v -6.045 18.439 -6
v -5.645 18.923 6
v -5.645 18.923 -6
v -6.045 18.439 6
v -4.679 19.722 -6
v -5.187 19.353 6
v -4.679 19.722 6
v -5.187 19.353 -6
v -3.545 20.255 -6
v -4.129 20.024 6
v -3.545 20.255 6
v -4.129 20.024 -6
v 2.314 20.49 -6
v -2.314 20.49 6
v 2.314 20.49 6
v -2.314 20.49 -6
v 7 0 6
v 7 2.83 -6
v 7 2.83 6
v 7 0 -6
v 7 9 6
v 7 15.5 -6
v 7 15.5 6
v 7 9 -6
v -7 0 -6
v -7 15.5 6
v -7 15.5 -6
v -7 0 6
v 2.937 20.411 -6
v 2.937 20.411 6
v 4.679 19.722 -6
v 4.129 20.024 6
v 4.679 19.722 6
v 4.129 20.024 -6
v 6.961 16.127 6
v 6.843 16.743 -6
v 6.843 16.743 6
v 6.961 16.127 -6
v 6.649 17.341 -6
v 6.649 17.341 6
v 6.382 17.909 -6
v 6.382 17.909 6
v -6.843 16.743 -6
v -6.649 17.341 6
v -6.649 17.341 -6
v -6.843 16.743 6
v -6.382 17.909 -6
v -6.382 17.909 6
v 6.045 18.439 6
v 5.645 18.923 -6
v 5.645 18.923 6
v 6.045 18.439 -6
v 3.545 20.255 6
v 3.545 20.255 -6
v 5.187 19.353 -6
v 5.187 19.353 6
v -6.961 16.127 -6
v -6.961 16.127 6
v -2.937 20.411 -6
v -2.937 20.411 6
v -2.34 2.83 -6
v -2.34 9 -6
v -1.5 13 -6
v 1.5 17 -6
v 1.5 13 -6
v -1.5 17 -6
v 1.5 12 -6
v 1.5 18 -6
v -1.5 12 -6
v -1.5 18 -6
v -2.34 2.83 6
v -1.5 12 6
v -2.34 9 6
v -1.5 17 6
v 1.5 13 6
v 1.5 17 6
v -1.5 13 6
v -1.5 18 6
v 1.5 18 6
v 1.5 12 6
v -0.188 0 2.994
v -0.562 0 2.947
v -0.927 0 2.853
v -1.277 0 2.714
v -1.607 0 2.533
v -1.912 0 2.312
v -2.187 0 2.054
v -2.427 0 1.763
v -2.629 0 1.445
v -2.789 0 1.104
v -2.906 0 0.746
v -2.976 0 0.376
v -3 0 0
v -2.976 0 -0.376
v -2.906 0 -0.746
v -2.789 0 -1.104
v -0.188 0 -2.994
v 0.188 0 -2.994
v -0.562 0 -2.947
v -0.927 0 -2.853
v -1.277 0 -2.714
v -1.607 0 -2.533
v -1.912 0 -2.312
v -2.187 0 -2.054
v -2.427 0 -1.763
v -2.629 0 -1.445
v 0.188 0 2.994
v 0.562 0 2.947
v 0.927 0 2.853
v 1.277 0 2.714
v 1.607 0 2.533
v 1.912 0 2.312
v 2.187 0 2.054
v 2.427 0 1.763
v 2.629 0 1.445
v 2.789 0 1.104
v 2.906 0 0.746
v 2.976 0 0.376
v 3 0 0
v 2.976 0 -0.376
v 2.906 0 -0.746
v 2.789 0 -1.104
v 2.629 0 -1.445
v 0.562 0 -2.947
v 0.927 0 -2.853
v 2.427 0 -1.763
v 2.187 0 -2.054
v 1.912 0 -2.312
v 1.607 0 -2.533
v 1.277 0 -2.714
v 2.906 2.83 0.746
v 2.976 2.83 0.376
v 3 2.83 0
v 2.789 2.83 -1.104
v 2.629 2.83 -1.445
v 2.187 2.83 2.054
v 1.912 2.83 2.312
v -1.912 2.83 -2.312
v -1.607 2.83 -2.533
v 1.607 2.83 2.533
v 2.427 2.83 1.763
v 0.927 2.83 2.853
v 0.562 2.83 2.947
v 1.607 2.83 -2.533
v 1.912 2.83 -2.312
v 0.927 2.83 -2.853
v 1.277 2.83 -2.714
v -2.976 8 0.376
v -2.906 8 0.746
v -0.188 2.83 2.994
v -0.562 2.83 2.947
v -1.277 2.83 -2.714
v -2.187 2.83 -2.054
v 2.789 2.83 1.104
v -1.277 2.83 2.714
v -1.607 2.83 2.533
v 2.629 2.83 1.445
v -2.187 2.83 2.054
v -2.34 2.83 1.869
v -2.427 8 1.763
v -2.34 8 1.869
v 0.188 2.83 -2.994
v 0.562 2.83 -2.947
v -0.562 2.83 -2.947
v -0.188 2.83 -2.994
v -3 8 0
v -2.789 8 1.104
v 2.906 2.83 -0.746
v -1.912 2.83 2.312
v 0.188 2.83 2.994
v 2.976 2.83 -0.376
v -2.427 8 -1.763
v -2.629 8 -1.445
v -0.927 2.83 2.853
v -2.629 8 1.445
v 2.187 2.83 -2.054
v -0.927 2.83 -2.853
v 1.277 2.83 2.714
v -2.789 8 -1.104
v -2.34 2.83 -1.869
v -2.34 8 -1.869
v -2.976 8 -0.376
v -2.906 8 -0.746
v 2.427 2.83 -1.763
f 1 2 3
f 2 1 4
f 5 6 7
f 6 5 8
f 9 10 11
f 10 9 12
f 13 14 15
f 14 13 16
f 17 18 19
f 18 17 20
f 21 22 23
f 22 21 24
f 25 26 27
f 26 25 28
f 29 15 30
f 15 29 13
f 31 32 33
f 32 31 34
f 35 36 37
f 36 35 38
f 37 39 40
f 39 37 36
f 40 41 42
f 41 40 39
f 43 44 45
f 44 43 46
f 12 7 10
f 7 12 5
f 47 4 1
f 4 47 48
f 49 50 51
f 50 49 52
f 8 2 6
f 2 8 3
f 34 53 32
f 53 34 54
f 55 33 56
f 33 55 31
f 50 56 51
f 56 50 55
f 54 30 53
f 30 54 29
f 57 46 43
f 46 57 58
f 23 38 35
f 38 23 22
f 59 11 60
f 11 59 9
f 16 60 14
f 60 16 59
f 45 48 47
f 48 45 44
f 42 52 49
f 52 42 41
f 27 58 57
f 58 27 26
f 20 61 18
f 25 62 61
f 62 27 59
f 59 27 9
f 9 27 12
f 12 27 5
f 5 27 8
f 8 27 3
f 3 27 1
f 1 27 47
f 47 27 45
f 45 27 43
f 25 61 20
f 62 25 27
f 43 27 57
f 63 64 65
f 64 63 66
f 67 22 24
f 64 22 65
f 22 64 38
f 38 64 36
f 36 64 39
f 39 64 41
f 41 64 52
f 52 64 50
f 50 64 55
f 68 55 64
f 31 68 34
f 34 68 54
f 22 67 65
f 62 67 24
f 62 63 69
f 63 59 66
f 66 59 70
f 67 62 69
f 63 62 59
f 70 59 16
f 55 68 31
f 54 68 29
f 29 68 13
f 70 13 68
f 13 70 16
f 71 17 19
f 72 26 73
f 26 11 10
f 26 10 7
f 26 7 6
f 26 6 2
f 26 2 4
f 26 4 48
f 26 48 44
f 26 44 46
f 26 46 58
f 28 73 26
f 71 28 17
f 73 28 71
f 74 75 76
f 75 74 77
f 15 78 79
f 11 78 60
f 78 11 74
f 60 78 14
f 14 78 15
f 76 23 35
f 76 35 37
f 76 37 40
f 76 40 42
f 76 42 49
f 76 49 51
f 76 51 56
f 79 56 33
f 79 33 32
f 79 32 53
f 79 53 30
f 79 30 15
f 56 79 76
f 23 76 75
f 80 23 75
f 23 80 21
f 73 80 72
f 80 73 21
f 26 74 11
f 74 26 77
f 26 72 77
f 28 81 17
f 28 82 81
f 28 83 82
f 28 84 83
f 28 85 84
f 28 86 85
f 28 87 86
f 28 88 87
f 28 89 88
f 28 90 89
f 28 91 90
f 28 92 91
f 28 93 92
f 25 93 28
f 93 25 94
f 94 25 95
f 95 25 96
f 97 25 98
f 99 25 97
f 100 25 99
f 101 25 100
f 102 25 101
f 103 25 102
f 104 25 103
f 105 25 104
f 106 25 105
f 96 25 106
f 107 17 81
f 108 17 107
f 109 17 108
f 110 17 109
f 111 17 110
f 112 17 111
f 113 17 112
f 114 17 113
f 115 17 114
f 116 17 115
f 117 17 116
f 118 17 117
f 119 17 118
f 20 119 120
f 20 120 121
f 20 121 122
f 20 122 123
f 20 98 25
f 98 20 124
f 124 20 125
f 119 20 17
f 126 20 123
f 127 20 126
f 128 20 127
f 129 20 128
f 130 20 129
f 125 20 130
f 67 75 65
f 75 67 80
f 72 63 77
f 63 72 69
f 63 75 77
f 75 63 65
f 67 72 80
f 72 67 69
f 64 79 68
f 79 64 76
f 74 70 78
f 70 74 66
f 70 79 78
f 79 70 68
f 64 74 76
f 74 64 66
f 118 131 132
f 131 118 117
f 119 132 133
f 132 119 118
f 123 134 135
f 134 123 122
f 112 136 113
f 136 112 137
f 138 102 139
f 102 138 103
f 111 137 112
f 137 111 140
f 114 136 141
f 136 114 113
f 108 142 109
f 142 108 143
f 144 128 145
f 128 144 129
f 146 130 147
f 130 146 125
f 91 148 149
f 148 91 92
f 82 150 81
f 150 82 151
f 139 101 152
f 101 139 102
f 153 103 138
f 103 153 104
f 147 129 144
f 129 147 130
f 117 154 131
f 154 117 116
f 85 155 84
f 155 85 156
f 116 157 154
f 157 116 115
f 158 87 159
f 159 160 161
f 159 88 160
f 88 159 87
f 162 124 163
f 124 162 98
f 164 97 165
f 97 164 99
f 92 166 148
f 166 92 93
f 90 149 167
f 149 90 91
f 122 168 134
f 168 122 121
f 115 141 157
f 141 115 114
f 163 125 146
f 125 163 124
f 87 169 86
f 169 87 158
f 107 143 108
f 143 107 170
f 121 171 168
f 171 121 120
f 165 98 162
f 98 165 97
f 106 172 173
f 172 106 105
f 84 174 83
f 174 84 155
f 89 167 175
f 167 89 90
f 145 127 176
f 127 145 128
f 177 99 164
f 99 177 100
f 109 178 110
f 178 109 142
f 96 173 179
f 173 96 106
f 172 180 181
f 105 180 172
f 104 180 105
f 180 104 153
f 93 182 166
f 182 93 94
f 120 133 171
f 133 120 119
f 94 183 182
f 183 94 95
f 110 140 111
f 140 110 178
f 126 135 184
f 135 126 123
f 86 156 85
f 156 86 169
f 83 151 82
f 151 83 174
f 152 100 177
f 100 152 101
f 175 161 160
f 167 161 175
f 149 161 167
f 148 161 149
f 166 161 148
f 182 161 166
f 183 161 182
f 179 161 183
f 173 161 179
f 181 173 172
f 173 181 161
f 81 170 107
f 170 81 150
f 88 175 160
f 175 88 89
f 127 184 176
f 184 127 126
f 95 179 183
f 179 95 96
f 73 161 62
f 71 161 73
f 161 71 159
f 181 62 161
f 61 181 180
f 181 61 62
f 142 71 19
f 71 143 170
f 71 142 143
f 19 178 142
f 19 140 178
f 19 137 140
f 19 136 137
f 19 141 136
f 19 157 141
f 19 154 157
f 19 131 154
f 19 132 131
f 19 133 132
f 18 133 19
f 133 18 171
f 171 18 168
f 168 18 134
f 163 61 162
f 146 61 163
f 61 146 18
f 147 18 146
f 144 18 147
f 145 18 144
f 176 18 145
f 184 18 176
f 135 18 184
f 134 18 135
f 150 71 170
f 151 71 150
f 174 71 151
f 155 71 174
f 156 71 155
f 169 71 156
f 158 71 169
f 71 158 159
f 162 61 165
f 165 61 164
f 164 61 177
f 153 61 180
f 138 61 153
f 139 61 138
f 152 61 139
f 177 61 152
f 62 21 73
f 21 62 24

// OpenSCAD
$fn = 50;


difference() {
	union() {
		translate(v = [0, 13.5000000000, -6.0000000000]) {
			rotate(a = [0, 0, 0]) {
				hull() {
					translate(v = [-2.0000000000, 2.0000000000, 0]) {
						rotate(a = [0, 0, 0]) {
							translate(v = [0, 0, 0]) {
								rotate(a = [0, 0, 0]) {
									cylinder(h = 12, r = 5);
								}
							}
						}
					}
					translate(v = [2.0000000000, 2.0000000000, 0]) {
						rotate(a = [0, 0, 0]) {
							translate(v = [0, 0, 0]) {
								rotate(a = [0, 0, 0]) {
									cylinder(h = 12, r = 5);
								}
							}
						}
					}
					translate(v = [-2.0000000000, -2.0000000000, 0]) {
						rotate(a = [0, 0, 0]) {
							translate(v = [0, 0, 0]) {
								rotate(a = [0, 0, 0]) {
									cylinder(h = 12, r = 5);
								}
							}
						}
					}
					translate(v = [2.0000000000, -2.0000000000, 0]) {
						rotate(a = [0, 0, 0]) {
							translate(v = [0, 0, 0]) {
								rotate(a = [0, 0, 0]) {
									cylinder(h = 12, r = 5);
								}
							}
						}
					}
				}
			}
		}
		translate(v = [-7.0000000000, 0, -6.0000000000]) {
			rotate(a = [0, 0, 0]) {
				cube(size = [14, 13.5000000000, 12]);
			}
		}
	}
	union() {
		translate(v = [-1.5000000000, 12.0000000000, -50]) {
			rotate(a = [0, 0, 0]) {
				cube(size = [3, 1, 100]);
			}
		}
		translate(v = [-1.5000000000, 17.0000000000, -50]) {
			rotate(a = [0, 0, 0]) {
				cube(size = [3, 1, 100]);
			}
		}
		translate(v = [0.0000000000, 8, 0]) {
			rotate(a = [90, 0, 0]) {
				cylinder(h = 8, r = 3.0000000000);
			}
		}
		translate(v = [-2.3396880416, 9, -25]) {
			rotate(a = [90, 0, 0]) {
				cube(size = [9.3587521664, 100, 6.1700000000]);
			}
		}
	}
}
